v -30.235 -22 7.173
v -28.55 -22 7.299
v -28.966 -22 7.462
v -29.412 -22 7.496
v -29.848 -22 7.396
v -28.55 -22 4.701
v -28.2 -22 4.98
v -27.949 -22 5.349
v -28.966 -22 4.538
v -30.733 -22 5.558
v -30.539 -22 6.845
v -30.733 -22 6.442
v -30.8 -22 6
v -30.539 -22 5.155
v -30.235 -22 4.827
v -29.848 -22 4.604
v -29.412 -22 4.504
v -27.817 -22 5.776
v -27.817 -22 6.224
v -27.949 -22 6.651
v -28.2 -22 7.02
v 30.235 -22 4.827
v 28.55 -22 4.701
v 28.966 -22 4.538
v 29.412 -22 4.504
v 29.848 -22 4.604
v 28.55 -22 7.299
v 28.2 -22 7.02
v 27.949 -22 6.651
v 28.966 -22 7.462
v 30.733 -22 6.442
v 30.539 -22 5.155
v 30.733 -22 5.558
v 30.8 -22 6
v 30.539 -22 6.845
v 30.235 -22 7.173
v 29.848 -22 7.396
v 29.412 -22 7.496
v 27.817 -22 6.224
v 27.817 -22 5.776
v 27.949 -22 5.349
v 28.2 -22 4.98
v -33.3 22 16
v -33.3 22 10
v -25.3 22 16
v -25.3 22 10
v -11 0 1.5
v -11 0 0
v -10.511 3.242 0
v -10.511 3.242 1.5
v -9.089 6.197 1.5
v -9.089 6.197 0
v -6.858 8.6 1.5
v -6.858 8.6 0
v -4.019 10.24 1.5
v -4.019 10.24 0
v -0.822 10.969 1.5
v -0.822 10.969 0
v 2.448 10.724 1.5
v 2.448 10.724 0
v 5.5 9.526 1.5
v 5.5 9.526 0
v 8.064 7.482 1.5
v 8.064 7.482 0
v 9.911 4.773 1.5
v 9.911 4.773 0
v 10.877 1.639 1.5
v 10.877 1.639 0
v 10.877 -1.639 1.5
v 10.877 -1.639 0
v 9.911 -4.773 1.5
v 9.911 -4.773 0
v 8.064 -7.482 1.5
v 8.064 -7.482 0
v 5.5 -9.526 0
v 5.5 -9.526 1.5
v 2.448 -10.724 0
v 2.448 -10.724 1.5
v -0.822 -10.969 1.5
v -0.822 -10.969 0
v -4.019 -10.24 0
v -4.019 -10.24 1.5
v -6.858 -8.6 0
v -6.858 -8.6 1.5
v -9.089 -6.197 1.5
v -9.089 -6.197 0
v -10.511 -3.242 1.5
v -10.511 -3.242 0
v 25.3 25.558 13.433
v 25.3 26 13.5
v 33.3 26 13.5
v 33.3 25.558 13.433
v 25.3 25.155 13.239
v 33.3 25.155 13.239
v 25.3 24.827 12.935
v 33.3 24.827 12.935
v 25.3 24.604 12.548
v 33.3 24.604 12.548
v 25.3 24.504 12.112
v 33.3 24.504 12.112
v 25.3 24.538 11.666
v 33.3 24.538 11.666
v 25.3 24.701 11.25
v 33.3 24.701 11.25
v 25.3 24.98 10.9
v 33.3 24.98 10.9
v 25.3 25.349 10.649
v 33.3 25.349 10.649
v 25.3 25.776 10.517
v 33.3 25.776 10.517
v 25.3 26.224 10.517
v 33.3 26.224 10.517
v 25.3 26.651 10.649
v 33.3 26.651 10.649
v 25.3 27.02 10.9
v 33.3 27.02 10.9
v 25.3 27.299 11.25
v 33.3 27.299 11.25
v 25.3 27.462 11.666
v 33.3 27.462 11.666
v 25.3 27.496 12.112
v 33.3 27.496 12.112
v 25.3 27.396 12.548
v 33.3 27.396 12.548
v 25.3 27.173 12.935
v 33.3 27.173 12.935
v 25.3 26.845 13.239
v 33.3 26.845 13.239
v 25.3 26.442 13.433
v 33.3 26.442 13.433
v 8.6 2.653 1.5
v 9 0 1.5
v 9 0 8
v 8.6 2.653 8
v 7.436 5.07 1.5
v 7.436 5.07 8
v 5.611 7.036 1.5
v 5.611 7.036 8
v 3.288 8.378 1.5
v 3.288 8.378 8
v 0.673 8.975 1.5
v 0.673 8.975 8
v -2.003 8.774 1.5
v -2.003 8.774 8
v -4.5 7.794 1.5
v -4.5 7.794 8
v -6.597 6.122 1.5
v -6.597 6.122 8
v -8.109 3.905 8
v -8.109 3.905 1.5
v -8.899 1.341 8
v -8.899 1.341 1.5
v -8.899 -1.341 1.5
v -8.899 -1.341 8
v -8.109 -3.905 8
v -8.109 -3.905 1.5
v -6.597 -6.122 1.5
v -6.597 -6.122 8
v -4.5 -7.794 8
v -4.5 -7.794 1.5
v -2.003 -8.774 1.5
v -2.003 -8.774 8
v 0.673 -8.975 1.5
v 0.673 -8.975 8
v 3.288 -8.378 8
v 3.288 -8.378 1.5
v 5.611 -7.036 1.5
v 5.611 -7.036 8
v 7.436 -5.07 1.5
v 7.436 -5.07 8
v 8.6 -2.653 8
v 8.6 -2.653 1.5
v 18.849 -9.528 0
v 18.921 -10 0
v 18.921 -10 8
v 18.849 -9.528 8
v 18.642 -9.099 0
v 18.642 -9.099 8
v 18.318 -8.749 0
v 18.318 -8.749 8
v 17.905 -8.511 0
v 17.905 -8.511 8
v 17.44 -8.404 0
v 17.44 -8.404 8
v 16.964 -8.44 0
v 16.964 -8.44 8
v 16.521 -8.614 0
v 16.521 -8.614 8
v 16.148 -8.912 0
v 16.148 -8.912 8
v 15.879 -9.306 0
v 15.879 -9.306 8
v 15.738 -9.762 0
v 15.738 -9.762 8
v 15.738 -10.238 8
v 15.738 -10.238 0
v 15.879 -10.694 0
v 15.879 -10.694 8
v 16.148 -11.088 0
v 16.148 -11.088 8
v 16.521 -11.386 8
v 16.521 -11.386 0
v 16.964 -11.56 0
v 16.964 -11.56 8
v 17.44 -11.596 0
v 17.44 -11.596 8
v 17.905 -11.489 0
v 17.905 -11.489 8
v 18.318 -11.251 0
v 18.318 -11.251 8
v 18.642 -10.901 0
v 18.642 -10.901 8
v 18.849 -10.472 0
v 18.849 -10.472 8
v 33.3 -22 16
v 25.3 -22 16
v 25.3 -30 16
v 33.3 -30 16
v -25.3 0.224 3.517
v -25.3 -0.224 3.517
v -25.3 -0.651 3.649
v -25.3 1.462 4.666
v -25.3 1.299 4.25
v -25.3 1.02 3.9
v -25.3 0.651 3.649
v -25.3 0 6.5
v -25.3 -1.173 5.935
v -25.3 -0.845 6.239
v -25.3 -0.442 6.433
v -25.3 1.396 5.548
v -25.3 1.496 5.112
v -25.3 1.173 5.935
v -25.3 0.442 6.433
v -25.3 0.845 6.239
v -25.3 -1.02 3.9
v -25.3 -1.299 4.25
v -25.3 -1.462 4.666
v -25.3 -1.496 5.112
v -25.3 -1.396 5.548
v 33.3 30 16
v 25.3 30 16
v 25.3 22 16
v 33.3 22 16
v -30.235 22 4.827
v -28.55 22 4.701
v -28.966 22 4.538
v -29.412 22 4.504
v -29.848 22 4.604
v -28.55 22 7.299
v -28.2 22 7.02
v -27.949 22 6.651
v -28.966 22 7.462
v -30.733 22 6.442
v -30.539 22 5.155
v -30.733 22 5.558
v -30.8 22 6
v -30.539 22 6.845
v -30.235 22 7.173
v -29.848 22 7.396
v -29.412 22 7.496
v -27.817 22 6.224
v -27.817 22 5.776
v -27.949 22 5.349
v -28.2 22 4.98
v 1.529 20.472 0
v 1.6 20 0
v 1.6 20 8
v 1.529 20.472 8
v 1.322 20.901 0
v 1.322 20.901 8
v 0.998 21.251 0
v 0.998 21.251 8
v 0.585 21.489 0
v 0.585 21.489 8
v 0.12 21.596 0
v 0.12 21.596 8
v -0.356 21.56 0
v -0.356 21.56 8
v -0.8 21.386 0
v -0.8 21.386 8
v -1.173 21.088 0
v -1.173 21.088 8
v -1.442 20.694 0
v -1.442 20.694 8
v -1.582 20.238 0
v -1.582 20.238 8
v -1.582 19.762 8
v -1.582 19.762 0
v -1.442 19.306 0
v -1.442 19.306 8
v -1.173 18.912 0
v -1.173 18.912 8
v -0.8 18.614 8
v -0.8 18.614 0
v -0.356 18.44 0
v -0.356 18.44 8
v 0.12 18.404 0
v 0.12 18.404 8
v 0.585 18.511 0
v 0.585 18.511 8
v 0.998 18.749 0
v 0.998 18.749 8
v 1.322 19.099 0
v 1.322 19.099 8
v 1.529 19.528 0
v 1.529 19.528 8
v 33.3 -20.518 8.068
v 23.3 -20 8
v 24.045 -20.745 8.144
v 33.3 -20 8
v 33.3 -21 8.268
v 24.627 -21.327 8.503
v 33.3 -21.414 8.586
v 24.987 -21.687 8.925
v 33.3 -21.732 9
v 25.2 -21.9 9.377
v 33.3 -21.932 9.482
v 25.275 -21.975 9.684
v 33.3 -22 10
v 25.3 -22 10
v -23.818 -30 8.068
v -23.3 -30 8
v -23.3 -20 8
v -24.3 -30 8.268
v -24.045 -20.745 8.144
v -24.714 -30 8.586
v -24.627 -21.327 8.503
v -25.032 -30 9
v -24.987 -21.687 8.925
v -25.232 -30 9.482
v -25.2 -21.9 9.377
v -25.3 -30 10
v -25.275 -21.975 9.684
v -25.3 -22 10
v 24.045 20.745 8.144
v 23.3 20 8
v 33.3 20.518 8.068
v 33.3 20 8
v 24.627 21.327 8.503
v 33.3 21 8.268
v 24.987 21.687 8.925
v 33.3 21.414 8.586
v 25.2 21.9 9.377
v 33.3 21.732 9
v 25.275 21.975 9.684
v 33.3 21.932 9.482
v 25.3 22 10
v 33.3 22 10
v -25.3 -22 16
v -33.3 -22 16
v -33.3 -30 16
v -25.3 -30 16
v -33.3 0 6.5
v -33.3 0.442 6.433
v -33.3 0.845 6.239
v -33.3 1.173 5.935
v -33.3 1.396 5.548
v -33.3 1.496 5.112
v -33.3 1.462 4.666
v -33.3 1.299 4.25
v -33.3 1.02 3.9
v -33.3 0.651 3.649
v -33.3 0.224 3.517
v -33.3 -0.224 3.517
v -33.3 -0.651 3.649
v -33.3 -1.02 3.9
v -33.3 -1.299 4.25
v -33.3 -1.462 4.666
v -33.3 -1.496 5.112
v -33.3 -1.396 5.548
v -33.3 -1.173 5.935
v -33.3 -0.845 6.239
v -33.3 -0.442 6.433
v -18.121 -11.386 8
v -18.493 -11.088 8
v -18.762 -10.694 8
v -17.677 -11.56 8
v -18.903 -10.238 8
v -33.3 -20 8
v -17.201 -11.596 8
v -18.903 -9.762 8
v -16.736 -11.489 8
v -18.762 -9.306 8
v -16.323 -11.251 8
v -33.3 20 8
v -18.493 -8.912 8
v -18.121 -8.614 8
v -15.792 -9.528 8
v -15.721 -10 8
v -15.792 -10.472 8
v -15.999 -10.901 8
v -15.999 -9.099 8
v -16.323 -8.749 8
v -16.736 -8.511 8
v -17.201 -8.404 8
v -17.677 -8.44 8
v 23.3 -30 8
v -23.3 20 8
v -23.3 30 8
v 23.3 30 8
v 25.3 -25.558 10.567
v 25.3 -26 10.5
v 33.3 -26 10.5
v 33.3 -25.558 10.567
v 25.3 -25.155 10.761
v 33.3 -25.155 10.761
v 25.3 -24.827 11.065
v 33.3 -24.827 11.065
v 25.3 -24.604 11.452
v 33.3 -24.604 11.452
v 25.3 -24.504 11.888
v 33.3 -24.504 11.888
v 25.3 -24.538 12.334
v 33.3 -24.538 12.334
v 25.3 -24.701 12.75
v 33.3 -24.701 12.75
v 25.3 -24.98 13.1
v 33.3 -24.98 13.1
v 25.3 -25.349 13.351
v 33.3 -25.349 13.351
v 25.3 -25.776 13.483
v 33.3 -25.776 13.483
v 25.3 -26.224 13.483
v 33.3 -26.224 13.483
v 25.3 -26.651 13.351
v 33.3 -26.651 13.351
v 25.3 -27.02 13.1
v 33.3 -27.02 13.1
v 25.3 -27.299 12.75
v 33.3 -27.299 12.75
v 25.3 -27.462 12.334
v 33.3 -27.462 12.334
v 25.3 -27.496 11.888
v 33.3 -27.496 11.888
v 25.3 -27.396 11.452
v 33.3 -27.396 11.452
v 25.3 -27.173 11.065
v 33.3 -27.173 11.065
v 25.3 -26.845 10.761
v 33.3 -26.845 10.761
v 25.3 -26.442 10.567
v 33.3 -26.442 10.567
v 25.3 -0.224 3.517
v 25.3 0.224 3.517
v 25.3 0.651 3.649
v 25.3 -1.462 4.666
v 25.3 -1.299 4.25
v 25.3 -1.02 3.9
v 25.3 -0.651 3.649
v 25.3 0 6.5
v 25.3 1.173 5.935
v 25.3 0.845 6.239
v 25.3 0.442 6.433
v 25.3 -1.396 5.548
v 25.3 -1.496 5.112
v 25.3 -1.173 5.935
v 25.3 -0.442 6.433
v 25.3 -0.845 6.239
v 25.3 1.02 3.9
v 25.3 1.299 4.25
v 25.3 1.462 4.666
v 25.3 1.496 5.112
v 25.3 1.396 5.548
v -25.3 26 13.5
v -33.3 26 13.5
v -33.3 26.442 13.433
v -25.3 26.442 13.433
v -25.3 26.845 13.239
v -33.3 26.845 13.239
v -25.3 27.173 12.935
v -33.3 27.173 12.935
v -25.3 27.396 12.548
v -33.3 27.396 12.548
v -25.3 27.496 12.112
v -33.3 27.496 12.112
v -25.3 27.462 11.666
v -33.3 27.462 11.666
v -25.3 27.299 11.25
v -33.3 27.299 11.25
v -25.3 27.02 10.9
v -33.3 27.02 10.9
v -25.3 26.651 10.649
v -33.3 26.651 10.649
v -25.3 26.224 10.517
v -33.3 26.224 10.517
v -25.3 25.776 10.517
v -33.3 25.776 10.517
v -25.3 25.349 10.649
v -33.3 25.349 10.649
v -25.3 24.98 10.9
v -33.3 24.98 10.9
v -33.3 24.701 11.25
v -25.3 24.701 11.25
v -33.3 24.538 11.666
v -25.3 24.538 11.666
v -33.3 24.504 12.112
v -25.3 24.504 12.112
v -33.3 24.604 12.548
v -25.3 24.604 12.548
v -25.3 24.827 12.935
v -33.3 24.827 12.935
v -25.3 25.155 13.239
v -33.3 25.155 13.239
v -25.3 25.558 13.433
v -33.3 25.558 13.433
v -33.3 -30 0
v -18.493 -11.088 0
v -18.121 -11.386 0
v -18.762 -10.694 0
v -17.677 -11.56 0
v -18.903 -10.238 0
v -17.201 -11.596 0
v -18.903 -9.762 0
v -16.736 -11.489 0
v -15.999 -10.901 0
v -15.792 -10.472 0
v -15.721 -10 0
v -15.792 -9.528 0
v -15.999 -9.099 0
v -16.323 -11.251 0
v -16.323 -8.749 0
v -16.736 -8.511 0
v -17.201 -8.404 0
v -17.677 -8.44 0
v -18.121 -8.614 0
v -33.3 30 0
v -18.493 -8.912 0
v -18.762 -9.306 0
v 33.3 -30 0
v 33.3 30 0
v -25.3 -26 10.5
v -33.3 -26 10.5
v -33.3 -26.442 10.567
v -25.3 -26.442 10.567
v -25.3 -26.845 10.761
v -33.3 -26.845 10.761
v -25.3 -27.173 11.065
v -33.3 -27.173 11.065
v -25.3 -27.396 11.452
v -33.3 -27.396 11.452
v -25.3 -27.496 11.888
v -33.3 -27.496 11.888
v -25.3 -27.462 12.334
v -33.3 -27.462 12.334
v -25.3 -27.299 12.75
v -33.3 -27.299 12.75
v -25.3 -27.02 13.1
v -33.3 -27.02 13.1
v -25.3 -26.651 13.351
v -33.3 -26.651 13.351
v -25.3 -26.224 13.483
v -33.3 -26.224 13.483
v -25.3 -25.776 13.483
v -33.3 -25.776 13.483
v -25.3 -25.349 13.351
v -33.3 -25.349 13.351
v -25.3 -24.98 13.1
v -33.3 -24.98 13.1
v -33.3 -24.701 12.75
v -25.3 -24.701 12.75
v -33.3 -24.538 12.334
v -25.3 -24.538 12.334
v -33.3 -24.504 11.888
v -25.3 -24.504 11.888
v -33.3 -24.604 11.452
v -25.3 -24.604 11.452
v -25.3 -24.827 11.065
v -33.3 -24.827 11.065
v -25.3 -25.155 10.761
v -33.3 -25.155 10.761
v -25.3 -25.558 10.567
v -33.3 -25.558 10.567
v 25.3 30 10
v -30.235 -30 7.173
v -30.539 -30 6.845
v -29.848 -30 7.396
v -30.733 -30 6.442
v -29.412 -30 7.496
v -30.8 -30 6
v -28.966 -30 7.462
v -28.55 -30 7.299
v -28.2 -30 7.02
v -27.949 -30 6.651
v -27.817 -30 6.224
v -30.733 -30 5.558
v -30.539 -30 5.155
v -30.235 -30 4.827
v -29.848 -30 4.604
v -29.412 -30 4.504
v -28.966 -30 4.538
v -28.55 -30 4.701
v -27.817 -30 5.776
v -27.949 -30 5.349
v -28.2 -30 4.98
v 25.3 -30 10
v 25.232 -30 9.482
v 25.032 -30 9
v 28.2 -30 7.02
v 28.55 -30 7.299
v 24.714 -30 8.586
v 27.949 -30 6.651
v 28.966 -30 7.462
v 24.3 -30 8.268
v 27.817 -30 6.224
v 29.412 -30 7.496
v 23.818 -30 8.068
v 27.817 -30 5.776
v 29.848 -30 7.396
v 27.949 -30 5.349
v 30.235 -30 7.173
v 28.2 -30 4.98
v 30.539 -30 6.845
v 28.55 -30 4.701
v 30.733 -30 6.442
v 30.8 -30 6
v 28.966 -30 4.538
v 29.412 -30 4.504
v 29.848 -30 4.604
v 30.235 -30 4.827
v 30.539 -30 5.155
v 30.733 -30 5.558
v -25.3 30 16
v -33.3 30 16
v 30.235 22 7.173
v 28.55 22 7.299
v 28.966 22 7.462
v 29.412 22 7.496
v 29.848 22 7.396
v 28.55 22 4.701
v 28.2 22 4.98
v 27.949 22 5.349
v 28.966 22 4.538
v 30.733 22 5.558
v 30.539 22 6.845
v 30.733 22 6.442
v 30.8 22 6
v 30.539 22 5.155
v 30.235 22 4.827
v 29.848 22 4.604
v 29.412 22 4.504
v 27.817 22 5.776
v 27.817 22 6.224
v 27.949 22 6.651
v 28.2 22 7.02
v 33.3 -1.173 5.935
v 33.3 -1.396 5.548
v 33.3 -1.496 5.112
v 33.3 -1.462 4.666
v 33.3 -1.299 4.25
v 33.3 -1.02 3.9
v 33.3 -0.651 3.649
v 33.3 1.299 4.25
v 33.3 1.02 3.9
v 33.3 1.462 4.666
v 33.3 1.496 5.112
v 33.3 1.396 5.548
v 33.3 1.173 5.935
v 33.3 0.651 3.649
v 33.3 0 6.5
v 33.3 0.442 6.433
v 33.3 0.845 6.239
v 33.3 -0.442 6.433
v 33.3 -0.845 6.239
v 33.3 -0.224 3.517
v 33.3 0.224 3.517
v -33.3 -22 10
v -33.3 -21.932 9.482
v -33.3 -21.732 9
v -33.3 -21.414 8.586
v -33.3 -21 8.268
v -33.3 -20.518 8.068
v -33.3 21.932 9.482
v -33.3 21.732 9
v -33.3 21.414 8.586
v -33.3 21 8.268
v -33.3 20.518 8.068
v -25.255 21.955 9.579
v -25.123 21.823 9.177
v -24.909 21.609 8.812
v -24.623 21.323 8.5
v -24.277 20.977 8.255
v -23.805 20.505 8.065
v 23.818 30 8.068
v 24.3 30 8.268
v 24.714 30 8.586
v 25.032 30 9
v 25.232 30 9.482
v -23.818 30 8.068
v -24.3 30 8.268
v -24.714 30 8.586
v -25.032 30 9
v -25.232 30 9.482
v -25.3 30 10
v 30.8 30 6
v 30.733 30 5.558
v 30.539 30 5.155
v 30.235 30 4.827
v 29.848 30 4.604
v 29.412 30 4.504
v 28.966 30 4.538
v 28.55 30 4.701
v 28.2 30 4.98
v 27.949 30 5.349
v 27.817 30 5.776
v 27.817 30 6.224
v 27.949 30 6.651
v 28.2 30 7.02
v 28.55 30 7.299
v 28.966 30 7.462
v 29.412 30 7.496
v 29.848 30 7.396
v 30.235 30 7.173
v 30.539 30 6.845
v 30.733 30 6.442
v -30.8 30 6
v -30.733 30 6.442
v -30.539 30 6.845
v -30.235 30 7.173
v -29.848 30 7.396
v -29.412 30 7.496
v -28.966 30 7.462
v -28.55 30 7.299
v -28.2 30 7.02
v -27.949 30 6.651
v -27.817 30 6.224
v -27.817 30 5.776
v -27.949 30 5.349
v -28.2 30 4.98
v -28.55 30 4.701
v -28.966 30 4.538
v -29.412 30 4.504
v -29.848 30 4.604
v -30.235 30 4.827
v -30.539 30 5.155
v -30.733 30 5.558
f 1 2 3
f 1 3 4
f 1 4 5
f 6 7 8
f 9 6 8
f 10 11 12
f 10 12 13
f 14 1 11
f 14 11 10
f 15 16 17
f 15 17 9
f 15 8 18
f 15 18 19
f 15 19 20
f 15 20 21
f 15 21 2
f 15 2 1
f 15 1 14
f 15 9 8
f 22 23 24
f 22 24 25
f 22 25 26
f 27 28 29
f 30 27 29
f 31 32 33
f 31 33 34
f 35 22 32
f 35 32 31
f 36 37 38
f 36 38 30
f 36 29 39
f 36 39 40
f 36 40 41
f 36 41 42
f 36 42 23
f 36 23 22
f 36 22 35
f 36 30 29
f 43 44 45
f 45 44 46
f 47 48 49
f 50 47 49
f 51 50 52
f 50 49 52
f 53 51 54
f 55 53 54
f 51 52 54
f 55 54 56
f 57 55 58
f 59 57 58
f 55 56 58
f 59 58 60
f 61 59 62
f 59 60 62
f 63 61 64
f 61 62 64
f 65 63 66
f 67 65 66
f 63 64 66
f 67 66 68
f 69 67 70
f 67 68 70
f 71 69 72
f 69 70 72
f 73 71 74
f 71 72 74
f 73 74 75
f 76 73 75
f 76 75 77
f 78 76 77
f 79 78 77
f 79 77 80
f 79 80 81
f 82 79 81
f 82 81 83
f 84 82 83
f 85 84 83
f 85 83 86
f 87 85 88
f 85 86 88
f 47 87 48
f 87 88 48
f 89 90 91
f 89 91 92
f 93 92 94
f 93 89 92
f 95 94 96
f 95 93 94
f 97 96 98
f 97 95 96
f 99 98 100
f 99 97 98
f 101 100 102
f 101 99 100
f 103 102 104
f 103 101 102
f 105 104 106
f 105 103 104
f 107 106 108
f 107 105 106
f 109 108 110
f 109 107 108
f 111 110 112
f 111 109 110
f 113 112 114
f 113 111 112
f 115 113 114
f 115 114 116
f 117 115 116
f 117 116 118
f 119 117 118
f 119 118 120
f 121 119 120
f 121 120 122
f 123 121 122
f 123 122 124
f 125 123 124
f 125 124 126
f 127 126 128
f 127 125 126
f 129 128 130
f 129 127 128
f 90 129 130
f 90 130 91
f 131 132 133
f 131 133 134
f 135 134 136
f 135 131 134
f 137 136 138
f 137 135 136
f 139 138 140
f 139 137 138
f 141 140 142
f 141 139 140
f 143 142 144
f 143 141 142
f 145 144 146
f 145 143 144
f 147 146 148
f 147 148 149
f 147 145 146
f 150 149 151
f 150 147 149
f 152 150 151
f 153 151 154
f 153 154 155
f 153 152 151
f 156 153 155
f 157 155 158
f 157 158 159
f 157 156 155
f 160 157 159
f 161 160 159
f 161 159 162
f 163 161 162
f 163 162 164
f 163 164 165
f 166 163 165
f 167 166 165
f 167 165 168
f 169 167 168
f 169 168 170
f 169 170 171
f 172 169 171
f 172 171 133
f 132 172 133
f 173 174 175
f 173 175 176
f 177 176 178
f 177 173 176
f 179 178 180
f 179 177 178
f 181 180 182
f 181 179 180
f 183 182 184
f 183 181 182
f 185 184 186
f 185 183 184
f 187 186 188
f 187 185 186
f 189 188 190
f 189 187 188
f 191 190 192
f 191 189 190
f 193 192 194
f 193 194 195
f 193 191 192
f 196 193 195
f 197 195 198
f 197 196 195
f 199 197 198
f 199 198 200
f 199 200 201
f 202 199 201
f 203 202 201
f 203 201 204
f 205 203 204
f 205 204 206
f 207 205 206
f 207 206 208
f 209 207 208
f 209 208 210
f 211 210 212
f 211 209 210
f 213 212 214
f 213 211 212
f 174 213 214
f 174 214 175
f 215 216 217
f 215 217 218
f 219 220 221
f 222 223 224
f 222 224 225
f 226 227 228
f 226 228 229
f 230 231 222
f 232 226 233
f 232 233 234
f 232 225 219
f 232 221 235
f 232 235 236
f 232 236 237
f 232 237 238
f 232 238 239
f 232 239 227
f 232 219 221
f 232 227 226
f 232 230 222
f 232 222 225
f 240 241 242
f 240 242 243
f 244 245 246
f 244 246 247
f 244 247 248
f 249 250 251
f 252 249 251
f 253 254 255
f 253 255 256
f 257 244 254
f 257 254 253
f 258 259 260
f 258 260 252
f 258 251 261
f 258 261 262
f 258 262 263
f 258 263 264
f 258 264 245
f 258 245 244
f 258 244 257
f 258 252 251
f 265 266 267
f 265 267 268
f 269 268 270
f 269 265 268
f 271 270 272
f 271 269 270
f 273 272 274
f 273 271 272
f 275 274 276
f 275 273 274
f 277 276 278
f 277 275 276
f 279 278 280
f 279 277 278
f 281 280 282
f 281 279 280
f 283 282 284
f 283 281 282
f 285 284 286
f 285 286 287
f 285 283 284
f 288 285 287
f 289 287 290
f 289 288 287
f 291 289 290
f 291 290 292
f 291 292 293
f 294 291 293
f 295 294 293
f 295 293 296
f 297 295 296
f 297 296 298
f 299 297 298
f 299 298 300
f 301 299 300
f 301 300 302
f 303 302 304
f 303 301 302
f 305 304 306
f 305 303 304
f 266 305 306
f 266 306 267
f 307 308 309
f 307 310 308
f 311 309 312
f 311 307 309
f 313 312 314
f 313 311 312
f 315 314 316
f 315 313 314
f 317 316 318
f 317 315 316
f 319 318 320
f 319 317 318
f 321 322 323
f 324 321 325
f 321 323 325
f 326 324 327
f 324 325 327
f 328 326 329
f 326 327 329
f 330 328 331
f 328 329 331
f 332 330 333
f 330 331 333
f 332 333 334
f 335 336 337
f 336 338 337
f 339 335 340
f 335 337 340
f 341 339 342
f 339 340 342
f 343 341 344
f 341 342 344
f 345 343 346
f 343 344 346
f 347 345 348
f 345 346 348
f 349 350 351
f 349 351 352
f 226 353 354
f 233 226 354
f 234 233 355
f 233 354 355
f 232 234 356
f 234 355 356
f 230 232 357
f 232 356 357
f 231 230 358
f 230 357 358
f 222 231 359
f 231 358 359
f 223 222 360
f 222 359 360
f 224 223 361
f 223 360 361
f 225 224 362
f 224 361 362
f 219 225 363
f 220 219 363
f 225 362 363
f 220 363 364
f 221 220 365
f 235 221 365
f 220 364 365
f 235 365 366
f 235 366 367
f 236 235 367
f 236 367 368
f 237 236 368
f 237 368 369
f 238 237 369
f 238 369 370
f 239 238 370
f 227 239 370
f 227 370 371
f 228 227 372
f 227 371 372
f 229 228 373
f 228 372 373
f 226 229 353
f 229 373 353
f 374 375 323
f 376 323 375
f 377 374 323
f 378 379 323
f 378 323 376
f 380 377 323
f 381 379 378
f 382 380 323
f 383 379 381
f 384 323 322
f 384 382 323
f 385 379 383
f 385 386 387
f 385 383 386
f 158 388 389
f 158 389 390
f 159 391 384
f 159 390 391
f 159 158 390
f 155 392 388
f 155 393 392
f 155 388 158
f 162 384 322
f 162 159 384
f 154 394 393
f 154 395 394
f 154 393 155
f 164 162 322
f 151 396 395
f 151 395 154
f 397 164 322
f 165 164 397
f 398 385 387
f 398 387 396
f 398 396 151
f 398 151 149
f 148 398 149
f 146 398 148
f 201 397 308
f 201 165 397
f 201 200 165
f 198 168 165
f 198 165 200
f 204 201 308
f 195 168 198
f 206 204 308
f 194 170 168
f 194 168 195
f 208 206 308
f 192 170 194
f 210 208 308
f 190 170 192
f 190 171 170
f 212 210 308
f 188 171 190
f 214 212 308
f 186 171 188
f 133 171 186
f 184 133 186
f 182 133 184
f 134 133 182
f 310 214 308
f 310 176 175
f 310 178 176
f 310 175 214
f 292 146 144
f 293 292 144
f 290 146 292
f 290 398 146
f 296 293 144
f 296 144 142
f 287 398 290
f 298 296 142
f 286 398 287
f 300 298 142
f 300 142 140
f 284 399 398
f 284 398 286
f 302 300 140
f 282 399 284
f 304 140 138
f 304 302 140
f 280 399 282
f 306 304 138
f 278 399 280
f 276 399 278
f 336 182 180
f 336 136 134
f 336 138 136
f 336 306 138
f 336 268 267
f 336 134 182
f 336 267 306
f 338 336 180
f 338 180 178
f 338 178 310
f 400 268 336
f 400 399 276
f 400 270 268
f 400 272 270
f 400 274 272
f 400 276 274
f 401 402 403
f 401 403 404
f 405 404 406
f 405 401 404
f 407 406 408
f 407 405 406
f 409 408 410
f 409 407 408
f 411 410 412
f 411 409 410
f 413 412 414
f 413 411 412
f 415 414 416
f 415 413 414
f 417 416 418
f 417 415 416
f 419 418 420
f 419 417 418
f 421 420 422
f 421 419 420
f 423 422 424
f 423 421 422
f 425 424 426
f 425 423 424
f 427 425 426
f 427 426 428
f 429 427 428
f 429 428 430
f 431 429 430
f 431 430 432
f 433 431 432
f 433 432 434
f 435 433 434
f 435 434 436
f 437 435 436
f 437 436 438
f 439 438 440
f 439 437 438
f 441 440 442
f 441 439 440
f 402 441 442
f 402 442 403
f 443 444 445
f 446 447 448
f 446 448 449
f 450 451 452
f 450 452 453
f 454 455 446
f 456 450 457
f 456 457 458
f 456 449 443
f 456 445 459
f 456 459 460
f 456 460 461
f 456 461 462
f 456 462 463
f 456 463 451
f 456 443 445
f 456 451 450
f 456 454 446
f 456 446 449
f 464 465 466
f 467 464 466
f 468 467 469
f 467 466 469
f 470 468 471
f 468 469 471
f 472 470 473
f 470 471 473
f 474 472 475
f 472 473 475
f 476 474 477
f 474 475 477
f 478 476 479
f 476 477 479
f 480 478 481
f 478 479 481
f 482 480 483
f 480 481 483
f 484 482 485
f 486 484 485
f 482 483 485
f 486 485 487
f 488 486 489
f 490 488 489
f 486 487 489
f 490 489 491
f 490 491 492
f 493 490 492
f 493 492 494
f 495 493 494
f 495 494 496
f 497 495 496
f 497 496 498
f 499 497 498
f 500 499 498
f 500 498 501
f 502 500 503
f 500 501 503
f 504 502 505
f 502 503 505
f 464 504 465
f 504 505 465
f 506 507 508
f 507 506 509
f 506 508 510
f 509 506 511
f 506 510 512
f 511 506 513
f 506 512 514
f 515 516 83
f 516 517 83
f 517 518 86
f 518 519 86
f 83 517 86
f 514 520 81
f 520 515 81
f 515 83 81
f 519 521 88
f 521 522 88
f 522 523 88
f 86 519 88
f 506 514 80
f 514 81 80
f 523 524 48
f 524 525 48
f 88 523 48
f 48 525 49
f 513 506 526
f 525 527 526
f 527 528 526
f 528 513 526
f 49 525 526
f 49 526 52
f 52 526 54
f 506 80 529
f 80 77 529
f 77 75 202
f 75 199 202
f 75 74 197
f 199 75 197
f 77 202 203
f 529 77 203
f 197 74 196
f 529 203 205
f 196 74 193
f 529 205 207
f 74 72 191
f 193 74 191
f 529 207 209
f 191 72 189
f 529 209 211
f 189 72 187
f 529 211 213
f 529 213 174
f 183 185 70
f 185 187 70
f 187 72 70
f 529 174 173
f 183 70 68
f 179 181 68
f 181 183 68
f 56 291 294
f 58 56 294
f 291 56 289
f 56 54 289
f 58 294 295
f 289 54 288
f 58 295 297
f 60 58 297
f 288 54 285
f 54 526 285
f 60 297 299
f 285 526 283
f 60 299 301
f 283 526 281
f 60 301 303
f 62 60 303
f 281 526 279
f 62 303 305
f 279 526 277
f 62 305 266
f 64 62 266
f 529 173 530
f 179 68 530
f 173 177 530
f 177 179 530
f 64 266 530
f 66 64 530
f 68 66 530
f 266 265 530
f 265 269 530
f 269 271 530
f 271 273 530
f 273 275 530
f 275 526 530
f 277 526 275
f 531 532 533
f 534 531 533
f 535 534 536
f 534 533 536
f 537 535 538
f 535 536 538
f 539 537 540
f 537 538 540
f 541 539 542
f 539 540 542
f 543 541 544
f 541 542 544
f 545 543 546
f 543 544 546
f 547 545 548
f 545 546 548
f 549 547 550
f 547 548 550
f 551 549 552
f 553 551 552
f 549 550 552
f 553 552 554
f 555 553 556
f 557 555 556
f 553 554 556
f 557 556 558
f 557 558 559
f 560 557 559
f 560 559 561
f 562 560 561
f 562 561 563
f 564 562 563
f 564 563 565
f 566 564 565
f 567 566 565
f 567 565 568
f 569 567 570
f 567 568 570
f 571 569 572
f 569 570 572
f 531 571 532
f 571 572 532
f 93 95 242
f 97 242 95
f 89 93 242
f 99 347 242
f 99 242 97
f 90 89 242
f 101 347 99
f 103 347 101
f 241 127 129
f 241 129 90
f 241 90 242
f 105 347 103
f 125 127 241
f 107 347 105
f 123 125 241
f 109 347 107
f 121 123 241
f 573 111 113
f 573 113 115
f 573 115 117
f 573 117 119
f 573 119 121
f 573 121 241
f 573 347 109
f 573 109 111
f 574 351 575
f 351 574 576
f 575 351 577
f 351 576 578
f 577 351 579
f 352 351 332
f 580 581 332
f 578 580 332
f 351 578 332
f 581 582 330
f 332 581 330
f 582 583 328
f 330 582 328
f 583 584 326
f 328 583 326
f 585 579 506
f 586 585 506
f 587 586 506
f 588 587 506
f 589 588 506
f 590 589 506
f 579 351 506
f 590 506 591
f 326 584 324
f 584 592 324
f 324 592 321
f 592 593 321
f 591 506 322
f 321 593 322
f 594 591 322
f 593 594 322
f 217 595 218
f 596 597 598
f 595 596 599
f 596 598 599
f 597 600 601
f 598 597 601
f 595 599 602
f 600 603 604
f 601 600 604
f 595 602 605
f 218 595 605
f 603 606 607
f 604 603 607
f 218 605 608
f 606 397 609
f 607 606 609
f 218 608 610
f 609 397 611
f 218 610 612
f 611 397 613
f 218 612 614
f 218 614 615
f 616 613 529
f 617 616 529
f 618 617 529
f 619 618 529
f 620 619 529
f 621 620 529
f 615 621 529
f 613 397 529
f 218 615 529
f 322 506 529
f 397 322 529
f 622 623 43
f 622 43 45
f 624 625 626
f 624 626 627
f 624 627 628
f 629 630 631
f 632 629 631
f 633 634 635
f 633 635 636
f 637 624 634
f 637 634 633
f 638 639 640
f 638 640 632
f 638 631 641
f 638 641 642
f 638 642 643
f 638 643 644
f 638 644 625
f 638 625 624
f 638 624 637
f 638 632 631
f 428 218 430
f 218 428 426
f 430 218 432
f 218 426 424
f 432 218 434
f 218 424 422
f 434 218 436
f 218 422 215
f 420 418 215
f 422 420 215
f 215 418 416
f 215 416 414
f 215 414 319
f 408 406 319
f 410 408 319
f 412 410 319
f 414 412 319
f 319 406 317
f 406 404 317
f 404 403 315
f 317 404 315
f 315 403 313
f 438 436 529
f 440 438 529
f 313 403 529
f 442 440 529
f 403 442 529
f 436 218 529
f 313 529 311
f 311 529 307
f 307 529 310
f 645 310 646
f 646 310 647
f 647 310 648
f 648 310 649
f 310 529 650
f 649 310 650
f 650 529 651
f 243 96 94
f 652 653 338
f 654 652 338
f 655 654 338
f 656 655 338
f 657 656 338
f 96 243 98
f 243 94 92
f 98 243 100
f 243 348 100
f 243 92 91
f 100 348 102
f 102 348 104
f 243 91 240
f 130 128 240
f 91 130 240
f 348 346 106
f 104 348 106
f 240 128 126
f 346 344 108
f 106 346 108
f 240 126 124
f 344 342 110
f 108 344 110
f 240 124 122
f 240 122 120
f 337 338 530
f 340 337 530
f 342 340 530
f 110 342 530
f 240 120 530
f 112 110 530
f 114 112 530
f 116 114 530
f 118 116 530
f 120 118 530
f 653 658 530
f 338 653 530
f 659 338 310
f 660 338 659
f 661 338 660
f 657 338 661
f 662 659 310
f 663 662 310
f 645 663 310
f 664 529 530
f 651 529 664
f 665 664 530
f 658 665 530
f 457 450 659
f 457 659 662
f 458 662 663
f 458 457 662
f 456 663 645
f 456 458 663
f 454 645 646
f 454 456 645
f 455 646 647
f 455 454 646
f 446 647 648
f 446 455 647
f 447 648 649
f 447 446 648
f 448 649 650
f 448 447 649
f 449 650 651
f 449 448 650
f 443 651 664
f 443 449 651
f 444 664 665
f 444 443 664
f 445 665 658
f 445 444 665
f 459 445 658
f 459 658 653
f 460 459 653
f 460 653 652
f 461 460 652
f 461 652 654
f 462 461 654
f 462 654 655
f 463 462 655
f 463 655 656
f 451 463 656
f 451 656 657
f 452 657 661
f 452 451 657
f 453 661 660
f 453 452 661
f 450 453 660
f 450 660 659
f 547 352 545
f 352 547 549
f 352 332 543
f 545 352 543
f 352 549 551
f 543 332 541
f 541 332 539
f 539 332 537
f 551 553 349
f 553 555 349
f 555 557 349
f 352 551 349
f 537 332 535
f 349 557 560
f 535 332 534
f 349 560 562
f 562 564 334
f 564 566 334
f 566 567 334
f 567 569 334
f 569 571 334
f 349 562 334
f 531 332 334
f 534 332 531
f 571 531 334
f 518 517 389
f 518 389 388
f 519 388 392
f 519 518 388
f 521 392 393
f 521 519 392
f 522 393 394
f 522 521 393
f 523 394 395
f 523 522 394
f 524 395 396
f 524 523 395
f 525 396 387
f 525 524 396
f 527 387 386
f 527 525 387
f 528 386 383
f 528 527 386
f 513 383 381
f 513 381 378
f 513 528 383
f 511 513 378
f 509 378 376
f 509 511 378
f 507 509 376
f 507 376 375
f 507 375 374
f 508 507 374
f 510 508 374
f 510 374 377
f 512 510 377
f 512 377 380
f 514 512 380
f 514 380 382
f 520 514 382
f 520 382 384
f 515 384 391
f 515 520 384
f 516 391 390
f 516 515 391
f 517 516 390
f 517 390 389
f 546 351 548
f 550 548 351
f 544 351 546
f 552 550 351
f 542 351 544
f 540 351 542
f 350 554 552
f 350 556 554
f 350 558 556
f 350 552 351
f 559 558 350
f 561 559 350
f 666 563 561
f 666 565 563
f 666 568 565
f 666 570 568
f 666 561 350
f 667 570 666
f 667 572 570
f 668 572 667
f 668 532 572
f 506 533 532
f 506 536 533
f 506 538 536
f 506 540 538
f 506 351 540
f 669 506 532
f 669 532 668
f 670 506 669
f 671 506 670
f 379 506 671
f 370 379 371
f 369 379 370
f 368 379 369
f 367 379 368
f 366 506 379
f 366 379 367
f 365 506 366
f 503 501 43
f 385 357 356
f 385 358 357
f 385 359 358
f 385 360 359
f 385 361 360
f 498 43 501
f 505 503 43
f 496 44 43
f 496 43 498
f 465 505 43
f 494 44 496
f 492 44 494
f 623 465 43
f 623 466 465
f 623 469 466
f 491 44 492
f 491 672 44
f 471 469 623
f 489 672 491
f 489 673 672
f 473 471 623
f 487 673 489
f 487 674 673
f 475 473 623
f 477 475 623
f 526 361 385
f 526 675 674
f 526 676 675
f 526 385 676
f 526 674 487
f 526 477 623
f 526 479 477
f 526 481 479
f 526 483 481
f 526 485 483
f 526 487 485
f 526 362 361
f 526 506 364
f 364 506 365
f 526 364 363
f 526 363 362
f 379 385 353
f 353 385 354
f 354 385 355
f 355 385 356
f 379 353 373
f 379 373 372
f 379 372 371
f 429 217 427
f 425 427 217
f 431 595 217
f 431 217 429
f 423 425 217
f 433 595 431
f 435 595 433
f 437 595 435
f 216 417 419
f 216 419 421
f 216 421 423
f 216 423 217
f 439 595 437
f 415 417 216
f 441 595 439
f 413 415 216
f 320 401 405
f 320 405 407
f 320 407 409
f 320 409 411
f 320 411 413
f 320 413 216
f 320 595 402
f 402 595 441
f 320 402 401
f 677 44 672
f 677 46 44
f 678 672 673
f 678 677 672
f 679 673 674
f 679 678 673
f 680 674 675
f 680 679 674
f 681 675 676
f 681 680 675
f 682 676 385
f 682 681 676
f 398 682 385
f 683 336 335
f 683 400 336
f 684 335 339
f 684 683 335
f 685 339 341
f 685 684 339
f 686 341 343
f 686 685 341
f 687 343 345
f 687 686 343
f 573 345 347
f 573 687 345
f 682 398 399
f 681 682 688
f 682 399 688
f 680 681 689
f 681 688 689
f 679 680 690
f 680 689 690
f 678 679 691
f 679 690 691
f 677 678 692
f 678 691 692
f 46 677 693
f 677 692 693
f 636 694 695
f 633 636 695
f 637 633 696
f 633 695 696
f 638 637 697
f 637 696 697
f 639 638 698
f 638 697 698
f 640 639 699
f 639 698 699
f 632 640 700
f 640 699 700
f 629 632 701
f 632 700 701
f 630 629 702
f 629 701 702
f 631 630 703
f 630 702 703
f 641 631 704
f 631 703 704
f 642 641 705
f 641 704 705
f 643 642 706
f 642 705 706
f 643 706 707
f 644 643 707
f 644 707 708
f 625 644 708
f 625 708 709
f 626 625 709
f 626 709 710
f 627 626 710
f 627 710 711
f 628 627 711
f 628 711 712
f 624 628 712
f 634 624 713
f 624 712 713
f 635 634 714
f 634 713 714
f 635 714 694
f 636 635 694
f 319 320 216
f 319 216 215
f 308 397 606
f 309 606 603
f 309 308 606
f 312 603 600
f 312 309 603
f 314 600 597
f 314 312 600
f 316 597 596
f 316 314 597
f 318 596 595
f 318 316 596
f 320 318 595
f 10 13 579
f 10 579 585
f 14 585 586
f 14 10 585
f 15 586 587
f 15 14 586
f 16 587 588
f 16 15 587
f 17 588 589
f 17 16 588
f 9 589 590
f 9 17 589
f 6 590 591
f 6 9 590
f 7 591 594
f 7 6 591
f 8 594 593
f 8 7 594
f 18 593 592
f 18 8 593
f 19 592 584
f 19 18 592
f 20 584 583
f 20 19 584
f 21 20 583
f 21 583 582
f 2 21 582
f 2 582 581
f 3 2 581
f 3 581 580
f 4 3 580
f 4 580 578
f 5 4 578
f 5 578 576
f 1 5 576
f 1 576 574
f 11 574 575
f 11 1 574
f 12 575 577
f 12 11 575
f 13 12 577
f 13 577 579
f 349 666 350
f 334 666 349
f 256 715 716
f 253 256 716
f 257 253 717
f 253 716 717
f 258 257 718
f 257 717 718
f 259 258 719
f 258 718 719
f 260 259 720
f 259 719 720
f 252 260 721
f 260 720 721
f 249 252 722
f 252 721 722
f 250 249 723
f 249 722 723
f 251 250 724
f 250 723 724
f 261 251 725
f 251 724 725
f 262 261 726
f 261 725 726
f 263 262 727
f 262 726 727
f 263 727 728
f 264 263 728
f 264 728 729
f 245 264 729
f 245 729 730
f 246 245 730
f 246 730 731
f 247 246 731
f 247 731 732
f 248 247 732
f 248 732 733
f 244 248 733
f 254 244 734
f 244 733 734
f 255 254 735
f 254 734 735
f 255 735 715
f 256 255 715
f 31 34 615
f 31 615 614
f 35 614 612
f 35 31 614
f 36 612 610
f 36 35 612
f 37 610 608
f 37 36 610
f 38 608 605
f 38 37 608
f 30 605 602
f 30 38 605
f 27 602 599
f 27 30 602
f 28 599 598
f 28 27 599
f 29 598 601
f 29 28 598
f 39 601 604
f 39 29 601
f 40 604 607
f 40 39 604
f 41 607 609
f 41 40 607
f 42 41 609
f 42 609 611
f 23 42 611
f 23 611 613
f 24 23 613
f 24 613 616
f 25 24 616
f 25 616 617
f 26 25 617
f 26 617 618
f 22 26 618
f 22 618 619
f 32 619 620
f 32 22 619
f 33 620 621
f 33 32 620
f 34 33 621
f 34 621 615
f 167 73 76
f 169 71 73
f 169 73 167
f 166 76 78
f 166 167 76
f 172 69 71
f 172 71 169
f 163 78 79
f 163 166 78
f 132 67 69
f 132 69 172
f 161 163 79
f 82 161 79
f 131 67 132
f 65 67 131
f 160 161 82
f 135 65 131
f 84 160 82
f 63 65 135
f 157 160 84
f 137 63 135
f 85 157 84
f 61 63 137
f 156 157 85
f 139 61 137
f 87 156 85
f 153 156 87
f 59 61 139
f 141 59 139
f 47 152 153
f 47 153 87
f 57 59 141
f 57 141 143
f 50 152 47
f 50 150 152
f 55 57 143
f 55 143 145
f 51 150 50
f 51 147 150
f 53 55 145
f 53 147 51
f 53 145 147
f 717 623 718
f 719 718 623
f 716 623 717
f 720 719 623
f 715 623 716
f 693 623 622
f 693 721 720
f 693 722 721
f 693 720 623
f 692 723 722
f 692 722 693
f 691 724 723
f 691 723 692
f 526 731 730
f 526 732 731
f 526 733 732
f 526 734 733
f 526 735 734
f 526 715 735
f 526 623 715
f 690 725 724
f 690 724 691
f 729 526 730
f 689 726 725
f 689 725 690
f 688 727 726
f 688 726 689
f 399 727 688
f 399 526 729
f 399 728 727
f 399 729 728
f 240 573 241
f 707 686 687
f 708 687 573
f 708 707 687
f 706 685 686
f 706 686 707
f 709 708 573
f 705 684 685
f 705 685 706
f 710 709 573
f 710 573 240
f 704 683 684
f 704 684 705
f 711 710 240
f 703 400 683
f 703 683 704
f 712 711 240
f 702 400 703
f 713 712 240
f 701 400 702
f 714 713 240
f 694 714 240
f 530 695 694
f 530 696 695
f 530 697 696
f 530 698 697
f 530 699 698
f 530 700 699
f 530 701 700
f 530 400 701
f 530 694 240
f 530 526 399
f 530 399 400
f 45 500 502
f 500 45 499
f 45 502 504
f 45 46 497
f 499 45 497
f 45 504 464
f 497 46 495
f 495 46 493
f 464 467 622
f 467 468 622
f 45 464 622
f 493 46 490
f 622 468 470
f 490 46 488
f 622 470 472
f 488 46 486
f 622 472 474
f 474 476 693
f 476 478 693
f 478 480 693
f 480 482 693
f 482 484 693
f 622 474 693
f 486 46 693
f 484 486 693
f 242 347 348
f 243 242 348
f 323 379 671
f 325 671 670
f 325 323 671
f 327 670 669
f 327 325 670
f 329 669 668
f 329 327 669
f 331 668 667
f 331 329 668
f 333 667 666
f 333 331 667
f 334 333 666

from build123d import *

# Parameters (mm, degrees)
SKETCH_1_W          = 66.6
SKETCH_1_H          = 60
SKETCH_1_R          = 1.6
SKETCH_1_R_2        = 9
EXTRUDE_1_DEPTH     = 8
SKETCH_3_W          = 8
SKETCH_3_H          = 8
EXTRUDE_2_DEPTH     = 8
SKETCH_4_R          = 1.5
CUT_EXTRUDE_1_DEPTH = 8
CUT_EXTRUDE_START   = -8
SKETCH_5_R          = 1.5
CUT_EXTRUDE_2_DEPTH = 8
SKETCH_6_R          = 1.5
CUT_EXTRUDE_3_DEPTH = 8
SKETCH_7_R          = 1.5
CUT_EXTRUDE_4_DEPTH = 8
FILLET_1_R          = 2
SKETCH_8_R          = 11
CUT_EXTRUDE_5_DEPTH = 1.5


with BuildPart() as part:
    # 草图1 → 凸台-拉伸1 (new body)
    with BuildSketch(Plane.XY):
        Rectangle(SKETCH_1_W, SKETCH_1_H)
        with Locations((0, 20)):
            Circle(SKETCH_1_R, mode=Mode.SUBTRACT)
        with Locations((17.320508076, -10)):
            Circle(SKETCH_1_R, mode=Mode.SUBTRACT)
        with Locations((-17.320508076, -10)):
            Circle(SKETCH_1_R, mode=Mode.SUBTRACT)
        Circle(SKETCH_1_R_2, mode=Mode.SUBTRACT)
    extrude(amount=EXTRUDE_1_DEPTH)

    # 草图3 → 凸台-拉伸2 (add)
    with BuildSketch(Plane.XY.offset(8)):
        with Locations((-29.3, 26)):
            Rectangle(SKETCH_3_W, SKETCH_3_H)
        with Locations((-29.3, -26)):
            Rectangle(SKETCH_3_W, SKETCH_3_H)
        with Locations((29.3, -26)):
            Rectangle(SKETCH_3_W, SKETCH_3_H)
        with Locations((29.3, 26)):
            Rectangle(SKETCH_3_W, SKETCH_3_H)
    extrude(amount=EXTRUDE_2_DEPTH)

    # 草图4 → 切除-拉伸1 (cut)
    with BuildSketch(Plane.ZY.offset(33.3)):
        with Locations((12, 26)):
            Circle(SKETCH_4_R)
        with Locations(Location((12, -26, 0), (0, 0, 180))):
            Circle(SKETCH_4_R)
        with Locations((5, 0)):
            Circle(SKETCH_4_R)
    extrude(amount=-CUT_EXTRUDE_1_DEPTH, mode=Mode.SUBTRACT)

    # 草图5 → 切除-拉伸2 (cut)
    with BuildSketch(Plane(origin=(33.3, 0, 0), x_dir=(0, 0, -1), z_dir=(1, 0, 0)).offset(CUT_EXTRUDE_START)):
        with Locations((-12, -26)):
            Circle(SKETCH_5_R)
        with Locations(Location((-12, 26, 0), (0, 0, 180))):
            Circle(SKETCH_5_R)
        with Locations(Location((-5, 0, 0), (0, 0, 180))):
            Circle(SKETCH_5_R)
    extrude(amount=CUT_EXTRUDE_2_DEPTH, mode=Mode.SUBTRACT)

    # 草图6 → 切除-拉伸3 (cut)
    with BuildSketch(Plane(origin=(0, 30, 0), x_dir=(1, 0, 0), z_dir=(0, 1, 0))):
        with Locations(Location((-29.3, -6, 0), (0, 0, 180))):
            Circle(SKETCH_6_R)
        with Locations((29.3, -6)):
            Circle(SKETCH_6_R)
    extrude(amount=-CUT_EXTRUDE_3_DEPTH, mode=Mode.SUBTRACT)

    # 草图7 → 切除-拉伸4 (cut)
    with BuildSketch(Plane.XZ.offset(30).offset(CUT_EXTRUDE_START)):
        with Locations((29.3, 6)):
            Circle(SKETCH_7_R)
        with Locations(Location((-29.3, 6, 0), (0, 0, 180))):
            Circle(SKETCH_7_R)
    extrude(amount=CUT_EXTRUDE_4_DEPTH, mode=Mode.SUBTRACT)

    # 圆角1
    fillet_1_edges = [part.edges().sort_by_distance(p)[0] for p in [
        (-29.3, 22, 8),
        (-25.3, 26, 8),
        (-25.3, -26, 8),
        (-29.3, -22, 8),
        (29.3, -22, 8),
        (25.3, -26, 8),
        (25.3, 26, 8),
        (29.3, 22, 8),
    ]]
    fillet(fillet_1_edges, radius=FILLET_1_R)

    # 草图8 → 切除-拉伸5 (cut)
    with BuildSketch(Plane(origin=(0, 0, 0), x_dir=(-1, 0, 0), z_dir=(0, 0, -1))):
        Circle(SKETCH_8_R)
    extrude(amount=-CUT_EXTRUDE_5_DEPTH, mode=Mode.SUBTRACT)


solid = part.part
